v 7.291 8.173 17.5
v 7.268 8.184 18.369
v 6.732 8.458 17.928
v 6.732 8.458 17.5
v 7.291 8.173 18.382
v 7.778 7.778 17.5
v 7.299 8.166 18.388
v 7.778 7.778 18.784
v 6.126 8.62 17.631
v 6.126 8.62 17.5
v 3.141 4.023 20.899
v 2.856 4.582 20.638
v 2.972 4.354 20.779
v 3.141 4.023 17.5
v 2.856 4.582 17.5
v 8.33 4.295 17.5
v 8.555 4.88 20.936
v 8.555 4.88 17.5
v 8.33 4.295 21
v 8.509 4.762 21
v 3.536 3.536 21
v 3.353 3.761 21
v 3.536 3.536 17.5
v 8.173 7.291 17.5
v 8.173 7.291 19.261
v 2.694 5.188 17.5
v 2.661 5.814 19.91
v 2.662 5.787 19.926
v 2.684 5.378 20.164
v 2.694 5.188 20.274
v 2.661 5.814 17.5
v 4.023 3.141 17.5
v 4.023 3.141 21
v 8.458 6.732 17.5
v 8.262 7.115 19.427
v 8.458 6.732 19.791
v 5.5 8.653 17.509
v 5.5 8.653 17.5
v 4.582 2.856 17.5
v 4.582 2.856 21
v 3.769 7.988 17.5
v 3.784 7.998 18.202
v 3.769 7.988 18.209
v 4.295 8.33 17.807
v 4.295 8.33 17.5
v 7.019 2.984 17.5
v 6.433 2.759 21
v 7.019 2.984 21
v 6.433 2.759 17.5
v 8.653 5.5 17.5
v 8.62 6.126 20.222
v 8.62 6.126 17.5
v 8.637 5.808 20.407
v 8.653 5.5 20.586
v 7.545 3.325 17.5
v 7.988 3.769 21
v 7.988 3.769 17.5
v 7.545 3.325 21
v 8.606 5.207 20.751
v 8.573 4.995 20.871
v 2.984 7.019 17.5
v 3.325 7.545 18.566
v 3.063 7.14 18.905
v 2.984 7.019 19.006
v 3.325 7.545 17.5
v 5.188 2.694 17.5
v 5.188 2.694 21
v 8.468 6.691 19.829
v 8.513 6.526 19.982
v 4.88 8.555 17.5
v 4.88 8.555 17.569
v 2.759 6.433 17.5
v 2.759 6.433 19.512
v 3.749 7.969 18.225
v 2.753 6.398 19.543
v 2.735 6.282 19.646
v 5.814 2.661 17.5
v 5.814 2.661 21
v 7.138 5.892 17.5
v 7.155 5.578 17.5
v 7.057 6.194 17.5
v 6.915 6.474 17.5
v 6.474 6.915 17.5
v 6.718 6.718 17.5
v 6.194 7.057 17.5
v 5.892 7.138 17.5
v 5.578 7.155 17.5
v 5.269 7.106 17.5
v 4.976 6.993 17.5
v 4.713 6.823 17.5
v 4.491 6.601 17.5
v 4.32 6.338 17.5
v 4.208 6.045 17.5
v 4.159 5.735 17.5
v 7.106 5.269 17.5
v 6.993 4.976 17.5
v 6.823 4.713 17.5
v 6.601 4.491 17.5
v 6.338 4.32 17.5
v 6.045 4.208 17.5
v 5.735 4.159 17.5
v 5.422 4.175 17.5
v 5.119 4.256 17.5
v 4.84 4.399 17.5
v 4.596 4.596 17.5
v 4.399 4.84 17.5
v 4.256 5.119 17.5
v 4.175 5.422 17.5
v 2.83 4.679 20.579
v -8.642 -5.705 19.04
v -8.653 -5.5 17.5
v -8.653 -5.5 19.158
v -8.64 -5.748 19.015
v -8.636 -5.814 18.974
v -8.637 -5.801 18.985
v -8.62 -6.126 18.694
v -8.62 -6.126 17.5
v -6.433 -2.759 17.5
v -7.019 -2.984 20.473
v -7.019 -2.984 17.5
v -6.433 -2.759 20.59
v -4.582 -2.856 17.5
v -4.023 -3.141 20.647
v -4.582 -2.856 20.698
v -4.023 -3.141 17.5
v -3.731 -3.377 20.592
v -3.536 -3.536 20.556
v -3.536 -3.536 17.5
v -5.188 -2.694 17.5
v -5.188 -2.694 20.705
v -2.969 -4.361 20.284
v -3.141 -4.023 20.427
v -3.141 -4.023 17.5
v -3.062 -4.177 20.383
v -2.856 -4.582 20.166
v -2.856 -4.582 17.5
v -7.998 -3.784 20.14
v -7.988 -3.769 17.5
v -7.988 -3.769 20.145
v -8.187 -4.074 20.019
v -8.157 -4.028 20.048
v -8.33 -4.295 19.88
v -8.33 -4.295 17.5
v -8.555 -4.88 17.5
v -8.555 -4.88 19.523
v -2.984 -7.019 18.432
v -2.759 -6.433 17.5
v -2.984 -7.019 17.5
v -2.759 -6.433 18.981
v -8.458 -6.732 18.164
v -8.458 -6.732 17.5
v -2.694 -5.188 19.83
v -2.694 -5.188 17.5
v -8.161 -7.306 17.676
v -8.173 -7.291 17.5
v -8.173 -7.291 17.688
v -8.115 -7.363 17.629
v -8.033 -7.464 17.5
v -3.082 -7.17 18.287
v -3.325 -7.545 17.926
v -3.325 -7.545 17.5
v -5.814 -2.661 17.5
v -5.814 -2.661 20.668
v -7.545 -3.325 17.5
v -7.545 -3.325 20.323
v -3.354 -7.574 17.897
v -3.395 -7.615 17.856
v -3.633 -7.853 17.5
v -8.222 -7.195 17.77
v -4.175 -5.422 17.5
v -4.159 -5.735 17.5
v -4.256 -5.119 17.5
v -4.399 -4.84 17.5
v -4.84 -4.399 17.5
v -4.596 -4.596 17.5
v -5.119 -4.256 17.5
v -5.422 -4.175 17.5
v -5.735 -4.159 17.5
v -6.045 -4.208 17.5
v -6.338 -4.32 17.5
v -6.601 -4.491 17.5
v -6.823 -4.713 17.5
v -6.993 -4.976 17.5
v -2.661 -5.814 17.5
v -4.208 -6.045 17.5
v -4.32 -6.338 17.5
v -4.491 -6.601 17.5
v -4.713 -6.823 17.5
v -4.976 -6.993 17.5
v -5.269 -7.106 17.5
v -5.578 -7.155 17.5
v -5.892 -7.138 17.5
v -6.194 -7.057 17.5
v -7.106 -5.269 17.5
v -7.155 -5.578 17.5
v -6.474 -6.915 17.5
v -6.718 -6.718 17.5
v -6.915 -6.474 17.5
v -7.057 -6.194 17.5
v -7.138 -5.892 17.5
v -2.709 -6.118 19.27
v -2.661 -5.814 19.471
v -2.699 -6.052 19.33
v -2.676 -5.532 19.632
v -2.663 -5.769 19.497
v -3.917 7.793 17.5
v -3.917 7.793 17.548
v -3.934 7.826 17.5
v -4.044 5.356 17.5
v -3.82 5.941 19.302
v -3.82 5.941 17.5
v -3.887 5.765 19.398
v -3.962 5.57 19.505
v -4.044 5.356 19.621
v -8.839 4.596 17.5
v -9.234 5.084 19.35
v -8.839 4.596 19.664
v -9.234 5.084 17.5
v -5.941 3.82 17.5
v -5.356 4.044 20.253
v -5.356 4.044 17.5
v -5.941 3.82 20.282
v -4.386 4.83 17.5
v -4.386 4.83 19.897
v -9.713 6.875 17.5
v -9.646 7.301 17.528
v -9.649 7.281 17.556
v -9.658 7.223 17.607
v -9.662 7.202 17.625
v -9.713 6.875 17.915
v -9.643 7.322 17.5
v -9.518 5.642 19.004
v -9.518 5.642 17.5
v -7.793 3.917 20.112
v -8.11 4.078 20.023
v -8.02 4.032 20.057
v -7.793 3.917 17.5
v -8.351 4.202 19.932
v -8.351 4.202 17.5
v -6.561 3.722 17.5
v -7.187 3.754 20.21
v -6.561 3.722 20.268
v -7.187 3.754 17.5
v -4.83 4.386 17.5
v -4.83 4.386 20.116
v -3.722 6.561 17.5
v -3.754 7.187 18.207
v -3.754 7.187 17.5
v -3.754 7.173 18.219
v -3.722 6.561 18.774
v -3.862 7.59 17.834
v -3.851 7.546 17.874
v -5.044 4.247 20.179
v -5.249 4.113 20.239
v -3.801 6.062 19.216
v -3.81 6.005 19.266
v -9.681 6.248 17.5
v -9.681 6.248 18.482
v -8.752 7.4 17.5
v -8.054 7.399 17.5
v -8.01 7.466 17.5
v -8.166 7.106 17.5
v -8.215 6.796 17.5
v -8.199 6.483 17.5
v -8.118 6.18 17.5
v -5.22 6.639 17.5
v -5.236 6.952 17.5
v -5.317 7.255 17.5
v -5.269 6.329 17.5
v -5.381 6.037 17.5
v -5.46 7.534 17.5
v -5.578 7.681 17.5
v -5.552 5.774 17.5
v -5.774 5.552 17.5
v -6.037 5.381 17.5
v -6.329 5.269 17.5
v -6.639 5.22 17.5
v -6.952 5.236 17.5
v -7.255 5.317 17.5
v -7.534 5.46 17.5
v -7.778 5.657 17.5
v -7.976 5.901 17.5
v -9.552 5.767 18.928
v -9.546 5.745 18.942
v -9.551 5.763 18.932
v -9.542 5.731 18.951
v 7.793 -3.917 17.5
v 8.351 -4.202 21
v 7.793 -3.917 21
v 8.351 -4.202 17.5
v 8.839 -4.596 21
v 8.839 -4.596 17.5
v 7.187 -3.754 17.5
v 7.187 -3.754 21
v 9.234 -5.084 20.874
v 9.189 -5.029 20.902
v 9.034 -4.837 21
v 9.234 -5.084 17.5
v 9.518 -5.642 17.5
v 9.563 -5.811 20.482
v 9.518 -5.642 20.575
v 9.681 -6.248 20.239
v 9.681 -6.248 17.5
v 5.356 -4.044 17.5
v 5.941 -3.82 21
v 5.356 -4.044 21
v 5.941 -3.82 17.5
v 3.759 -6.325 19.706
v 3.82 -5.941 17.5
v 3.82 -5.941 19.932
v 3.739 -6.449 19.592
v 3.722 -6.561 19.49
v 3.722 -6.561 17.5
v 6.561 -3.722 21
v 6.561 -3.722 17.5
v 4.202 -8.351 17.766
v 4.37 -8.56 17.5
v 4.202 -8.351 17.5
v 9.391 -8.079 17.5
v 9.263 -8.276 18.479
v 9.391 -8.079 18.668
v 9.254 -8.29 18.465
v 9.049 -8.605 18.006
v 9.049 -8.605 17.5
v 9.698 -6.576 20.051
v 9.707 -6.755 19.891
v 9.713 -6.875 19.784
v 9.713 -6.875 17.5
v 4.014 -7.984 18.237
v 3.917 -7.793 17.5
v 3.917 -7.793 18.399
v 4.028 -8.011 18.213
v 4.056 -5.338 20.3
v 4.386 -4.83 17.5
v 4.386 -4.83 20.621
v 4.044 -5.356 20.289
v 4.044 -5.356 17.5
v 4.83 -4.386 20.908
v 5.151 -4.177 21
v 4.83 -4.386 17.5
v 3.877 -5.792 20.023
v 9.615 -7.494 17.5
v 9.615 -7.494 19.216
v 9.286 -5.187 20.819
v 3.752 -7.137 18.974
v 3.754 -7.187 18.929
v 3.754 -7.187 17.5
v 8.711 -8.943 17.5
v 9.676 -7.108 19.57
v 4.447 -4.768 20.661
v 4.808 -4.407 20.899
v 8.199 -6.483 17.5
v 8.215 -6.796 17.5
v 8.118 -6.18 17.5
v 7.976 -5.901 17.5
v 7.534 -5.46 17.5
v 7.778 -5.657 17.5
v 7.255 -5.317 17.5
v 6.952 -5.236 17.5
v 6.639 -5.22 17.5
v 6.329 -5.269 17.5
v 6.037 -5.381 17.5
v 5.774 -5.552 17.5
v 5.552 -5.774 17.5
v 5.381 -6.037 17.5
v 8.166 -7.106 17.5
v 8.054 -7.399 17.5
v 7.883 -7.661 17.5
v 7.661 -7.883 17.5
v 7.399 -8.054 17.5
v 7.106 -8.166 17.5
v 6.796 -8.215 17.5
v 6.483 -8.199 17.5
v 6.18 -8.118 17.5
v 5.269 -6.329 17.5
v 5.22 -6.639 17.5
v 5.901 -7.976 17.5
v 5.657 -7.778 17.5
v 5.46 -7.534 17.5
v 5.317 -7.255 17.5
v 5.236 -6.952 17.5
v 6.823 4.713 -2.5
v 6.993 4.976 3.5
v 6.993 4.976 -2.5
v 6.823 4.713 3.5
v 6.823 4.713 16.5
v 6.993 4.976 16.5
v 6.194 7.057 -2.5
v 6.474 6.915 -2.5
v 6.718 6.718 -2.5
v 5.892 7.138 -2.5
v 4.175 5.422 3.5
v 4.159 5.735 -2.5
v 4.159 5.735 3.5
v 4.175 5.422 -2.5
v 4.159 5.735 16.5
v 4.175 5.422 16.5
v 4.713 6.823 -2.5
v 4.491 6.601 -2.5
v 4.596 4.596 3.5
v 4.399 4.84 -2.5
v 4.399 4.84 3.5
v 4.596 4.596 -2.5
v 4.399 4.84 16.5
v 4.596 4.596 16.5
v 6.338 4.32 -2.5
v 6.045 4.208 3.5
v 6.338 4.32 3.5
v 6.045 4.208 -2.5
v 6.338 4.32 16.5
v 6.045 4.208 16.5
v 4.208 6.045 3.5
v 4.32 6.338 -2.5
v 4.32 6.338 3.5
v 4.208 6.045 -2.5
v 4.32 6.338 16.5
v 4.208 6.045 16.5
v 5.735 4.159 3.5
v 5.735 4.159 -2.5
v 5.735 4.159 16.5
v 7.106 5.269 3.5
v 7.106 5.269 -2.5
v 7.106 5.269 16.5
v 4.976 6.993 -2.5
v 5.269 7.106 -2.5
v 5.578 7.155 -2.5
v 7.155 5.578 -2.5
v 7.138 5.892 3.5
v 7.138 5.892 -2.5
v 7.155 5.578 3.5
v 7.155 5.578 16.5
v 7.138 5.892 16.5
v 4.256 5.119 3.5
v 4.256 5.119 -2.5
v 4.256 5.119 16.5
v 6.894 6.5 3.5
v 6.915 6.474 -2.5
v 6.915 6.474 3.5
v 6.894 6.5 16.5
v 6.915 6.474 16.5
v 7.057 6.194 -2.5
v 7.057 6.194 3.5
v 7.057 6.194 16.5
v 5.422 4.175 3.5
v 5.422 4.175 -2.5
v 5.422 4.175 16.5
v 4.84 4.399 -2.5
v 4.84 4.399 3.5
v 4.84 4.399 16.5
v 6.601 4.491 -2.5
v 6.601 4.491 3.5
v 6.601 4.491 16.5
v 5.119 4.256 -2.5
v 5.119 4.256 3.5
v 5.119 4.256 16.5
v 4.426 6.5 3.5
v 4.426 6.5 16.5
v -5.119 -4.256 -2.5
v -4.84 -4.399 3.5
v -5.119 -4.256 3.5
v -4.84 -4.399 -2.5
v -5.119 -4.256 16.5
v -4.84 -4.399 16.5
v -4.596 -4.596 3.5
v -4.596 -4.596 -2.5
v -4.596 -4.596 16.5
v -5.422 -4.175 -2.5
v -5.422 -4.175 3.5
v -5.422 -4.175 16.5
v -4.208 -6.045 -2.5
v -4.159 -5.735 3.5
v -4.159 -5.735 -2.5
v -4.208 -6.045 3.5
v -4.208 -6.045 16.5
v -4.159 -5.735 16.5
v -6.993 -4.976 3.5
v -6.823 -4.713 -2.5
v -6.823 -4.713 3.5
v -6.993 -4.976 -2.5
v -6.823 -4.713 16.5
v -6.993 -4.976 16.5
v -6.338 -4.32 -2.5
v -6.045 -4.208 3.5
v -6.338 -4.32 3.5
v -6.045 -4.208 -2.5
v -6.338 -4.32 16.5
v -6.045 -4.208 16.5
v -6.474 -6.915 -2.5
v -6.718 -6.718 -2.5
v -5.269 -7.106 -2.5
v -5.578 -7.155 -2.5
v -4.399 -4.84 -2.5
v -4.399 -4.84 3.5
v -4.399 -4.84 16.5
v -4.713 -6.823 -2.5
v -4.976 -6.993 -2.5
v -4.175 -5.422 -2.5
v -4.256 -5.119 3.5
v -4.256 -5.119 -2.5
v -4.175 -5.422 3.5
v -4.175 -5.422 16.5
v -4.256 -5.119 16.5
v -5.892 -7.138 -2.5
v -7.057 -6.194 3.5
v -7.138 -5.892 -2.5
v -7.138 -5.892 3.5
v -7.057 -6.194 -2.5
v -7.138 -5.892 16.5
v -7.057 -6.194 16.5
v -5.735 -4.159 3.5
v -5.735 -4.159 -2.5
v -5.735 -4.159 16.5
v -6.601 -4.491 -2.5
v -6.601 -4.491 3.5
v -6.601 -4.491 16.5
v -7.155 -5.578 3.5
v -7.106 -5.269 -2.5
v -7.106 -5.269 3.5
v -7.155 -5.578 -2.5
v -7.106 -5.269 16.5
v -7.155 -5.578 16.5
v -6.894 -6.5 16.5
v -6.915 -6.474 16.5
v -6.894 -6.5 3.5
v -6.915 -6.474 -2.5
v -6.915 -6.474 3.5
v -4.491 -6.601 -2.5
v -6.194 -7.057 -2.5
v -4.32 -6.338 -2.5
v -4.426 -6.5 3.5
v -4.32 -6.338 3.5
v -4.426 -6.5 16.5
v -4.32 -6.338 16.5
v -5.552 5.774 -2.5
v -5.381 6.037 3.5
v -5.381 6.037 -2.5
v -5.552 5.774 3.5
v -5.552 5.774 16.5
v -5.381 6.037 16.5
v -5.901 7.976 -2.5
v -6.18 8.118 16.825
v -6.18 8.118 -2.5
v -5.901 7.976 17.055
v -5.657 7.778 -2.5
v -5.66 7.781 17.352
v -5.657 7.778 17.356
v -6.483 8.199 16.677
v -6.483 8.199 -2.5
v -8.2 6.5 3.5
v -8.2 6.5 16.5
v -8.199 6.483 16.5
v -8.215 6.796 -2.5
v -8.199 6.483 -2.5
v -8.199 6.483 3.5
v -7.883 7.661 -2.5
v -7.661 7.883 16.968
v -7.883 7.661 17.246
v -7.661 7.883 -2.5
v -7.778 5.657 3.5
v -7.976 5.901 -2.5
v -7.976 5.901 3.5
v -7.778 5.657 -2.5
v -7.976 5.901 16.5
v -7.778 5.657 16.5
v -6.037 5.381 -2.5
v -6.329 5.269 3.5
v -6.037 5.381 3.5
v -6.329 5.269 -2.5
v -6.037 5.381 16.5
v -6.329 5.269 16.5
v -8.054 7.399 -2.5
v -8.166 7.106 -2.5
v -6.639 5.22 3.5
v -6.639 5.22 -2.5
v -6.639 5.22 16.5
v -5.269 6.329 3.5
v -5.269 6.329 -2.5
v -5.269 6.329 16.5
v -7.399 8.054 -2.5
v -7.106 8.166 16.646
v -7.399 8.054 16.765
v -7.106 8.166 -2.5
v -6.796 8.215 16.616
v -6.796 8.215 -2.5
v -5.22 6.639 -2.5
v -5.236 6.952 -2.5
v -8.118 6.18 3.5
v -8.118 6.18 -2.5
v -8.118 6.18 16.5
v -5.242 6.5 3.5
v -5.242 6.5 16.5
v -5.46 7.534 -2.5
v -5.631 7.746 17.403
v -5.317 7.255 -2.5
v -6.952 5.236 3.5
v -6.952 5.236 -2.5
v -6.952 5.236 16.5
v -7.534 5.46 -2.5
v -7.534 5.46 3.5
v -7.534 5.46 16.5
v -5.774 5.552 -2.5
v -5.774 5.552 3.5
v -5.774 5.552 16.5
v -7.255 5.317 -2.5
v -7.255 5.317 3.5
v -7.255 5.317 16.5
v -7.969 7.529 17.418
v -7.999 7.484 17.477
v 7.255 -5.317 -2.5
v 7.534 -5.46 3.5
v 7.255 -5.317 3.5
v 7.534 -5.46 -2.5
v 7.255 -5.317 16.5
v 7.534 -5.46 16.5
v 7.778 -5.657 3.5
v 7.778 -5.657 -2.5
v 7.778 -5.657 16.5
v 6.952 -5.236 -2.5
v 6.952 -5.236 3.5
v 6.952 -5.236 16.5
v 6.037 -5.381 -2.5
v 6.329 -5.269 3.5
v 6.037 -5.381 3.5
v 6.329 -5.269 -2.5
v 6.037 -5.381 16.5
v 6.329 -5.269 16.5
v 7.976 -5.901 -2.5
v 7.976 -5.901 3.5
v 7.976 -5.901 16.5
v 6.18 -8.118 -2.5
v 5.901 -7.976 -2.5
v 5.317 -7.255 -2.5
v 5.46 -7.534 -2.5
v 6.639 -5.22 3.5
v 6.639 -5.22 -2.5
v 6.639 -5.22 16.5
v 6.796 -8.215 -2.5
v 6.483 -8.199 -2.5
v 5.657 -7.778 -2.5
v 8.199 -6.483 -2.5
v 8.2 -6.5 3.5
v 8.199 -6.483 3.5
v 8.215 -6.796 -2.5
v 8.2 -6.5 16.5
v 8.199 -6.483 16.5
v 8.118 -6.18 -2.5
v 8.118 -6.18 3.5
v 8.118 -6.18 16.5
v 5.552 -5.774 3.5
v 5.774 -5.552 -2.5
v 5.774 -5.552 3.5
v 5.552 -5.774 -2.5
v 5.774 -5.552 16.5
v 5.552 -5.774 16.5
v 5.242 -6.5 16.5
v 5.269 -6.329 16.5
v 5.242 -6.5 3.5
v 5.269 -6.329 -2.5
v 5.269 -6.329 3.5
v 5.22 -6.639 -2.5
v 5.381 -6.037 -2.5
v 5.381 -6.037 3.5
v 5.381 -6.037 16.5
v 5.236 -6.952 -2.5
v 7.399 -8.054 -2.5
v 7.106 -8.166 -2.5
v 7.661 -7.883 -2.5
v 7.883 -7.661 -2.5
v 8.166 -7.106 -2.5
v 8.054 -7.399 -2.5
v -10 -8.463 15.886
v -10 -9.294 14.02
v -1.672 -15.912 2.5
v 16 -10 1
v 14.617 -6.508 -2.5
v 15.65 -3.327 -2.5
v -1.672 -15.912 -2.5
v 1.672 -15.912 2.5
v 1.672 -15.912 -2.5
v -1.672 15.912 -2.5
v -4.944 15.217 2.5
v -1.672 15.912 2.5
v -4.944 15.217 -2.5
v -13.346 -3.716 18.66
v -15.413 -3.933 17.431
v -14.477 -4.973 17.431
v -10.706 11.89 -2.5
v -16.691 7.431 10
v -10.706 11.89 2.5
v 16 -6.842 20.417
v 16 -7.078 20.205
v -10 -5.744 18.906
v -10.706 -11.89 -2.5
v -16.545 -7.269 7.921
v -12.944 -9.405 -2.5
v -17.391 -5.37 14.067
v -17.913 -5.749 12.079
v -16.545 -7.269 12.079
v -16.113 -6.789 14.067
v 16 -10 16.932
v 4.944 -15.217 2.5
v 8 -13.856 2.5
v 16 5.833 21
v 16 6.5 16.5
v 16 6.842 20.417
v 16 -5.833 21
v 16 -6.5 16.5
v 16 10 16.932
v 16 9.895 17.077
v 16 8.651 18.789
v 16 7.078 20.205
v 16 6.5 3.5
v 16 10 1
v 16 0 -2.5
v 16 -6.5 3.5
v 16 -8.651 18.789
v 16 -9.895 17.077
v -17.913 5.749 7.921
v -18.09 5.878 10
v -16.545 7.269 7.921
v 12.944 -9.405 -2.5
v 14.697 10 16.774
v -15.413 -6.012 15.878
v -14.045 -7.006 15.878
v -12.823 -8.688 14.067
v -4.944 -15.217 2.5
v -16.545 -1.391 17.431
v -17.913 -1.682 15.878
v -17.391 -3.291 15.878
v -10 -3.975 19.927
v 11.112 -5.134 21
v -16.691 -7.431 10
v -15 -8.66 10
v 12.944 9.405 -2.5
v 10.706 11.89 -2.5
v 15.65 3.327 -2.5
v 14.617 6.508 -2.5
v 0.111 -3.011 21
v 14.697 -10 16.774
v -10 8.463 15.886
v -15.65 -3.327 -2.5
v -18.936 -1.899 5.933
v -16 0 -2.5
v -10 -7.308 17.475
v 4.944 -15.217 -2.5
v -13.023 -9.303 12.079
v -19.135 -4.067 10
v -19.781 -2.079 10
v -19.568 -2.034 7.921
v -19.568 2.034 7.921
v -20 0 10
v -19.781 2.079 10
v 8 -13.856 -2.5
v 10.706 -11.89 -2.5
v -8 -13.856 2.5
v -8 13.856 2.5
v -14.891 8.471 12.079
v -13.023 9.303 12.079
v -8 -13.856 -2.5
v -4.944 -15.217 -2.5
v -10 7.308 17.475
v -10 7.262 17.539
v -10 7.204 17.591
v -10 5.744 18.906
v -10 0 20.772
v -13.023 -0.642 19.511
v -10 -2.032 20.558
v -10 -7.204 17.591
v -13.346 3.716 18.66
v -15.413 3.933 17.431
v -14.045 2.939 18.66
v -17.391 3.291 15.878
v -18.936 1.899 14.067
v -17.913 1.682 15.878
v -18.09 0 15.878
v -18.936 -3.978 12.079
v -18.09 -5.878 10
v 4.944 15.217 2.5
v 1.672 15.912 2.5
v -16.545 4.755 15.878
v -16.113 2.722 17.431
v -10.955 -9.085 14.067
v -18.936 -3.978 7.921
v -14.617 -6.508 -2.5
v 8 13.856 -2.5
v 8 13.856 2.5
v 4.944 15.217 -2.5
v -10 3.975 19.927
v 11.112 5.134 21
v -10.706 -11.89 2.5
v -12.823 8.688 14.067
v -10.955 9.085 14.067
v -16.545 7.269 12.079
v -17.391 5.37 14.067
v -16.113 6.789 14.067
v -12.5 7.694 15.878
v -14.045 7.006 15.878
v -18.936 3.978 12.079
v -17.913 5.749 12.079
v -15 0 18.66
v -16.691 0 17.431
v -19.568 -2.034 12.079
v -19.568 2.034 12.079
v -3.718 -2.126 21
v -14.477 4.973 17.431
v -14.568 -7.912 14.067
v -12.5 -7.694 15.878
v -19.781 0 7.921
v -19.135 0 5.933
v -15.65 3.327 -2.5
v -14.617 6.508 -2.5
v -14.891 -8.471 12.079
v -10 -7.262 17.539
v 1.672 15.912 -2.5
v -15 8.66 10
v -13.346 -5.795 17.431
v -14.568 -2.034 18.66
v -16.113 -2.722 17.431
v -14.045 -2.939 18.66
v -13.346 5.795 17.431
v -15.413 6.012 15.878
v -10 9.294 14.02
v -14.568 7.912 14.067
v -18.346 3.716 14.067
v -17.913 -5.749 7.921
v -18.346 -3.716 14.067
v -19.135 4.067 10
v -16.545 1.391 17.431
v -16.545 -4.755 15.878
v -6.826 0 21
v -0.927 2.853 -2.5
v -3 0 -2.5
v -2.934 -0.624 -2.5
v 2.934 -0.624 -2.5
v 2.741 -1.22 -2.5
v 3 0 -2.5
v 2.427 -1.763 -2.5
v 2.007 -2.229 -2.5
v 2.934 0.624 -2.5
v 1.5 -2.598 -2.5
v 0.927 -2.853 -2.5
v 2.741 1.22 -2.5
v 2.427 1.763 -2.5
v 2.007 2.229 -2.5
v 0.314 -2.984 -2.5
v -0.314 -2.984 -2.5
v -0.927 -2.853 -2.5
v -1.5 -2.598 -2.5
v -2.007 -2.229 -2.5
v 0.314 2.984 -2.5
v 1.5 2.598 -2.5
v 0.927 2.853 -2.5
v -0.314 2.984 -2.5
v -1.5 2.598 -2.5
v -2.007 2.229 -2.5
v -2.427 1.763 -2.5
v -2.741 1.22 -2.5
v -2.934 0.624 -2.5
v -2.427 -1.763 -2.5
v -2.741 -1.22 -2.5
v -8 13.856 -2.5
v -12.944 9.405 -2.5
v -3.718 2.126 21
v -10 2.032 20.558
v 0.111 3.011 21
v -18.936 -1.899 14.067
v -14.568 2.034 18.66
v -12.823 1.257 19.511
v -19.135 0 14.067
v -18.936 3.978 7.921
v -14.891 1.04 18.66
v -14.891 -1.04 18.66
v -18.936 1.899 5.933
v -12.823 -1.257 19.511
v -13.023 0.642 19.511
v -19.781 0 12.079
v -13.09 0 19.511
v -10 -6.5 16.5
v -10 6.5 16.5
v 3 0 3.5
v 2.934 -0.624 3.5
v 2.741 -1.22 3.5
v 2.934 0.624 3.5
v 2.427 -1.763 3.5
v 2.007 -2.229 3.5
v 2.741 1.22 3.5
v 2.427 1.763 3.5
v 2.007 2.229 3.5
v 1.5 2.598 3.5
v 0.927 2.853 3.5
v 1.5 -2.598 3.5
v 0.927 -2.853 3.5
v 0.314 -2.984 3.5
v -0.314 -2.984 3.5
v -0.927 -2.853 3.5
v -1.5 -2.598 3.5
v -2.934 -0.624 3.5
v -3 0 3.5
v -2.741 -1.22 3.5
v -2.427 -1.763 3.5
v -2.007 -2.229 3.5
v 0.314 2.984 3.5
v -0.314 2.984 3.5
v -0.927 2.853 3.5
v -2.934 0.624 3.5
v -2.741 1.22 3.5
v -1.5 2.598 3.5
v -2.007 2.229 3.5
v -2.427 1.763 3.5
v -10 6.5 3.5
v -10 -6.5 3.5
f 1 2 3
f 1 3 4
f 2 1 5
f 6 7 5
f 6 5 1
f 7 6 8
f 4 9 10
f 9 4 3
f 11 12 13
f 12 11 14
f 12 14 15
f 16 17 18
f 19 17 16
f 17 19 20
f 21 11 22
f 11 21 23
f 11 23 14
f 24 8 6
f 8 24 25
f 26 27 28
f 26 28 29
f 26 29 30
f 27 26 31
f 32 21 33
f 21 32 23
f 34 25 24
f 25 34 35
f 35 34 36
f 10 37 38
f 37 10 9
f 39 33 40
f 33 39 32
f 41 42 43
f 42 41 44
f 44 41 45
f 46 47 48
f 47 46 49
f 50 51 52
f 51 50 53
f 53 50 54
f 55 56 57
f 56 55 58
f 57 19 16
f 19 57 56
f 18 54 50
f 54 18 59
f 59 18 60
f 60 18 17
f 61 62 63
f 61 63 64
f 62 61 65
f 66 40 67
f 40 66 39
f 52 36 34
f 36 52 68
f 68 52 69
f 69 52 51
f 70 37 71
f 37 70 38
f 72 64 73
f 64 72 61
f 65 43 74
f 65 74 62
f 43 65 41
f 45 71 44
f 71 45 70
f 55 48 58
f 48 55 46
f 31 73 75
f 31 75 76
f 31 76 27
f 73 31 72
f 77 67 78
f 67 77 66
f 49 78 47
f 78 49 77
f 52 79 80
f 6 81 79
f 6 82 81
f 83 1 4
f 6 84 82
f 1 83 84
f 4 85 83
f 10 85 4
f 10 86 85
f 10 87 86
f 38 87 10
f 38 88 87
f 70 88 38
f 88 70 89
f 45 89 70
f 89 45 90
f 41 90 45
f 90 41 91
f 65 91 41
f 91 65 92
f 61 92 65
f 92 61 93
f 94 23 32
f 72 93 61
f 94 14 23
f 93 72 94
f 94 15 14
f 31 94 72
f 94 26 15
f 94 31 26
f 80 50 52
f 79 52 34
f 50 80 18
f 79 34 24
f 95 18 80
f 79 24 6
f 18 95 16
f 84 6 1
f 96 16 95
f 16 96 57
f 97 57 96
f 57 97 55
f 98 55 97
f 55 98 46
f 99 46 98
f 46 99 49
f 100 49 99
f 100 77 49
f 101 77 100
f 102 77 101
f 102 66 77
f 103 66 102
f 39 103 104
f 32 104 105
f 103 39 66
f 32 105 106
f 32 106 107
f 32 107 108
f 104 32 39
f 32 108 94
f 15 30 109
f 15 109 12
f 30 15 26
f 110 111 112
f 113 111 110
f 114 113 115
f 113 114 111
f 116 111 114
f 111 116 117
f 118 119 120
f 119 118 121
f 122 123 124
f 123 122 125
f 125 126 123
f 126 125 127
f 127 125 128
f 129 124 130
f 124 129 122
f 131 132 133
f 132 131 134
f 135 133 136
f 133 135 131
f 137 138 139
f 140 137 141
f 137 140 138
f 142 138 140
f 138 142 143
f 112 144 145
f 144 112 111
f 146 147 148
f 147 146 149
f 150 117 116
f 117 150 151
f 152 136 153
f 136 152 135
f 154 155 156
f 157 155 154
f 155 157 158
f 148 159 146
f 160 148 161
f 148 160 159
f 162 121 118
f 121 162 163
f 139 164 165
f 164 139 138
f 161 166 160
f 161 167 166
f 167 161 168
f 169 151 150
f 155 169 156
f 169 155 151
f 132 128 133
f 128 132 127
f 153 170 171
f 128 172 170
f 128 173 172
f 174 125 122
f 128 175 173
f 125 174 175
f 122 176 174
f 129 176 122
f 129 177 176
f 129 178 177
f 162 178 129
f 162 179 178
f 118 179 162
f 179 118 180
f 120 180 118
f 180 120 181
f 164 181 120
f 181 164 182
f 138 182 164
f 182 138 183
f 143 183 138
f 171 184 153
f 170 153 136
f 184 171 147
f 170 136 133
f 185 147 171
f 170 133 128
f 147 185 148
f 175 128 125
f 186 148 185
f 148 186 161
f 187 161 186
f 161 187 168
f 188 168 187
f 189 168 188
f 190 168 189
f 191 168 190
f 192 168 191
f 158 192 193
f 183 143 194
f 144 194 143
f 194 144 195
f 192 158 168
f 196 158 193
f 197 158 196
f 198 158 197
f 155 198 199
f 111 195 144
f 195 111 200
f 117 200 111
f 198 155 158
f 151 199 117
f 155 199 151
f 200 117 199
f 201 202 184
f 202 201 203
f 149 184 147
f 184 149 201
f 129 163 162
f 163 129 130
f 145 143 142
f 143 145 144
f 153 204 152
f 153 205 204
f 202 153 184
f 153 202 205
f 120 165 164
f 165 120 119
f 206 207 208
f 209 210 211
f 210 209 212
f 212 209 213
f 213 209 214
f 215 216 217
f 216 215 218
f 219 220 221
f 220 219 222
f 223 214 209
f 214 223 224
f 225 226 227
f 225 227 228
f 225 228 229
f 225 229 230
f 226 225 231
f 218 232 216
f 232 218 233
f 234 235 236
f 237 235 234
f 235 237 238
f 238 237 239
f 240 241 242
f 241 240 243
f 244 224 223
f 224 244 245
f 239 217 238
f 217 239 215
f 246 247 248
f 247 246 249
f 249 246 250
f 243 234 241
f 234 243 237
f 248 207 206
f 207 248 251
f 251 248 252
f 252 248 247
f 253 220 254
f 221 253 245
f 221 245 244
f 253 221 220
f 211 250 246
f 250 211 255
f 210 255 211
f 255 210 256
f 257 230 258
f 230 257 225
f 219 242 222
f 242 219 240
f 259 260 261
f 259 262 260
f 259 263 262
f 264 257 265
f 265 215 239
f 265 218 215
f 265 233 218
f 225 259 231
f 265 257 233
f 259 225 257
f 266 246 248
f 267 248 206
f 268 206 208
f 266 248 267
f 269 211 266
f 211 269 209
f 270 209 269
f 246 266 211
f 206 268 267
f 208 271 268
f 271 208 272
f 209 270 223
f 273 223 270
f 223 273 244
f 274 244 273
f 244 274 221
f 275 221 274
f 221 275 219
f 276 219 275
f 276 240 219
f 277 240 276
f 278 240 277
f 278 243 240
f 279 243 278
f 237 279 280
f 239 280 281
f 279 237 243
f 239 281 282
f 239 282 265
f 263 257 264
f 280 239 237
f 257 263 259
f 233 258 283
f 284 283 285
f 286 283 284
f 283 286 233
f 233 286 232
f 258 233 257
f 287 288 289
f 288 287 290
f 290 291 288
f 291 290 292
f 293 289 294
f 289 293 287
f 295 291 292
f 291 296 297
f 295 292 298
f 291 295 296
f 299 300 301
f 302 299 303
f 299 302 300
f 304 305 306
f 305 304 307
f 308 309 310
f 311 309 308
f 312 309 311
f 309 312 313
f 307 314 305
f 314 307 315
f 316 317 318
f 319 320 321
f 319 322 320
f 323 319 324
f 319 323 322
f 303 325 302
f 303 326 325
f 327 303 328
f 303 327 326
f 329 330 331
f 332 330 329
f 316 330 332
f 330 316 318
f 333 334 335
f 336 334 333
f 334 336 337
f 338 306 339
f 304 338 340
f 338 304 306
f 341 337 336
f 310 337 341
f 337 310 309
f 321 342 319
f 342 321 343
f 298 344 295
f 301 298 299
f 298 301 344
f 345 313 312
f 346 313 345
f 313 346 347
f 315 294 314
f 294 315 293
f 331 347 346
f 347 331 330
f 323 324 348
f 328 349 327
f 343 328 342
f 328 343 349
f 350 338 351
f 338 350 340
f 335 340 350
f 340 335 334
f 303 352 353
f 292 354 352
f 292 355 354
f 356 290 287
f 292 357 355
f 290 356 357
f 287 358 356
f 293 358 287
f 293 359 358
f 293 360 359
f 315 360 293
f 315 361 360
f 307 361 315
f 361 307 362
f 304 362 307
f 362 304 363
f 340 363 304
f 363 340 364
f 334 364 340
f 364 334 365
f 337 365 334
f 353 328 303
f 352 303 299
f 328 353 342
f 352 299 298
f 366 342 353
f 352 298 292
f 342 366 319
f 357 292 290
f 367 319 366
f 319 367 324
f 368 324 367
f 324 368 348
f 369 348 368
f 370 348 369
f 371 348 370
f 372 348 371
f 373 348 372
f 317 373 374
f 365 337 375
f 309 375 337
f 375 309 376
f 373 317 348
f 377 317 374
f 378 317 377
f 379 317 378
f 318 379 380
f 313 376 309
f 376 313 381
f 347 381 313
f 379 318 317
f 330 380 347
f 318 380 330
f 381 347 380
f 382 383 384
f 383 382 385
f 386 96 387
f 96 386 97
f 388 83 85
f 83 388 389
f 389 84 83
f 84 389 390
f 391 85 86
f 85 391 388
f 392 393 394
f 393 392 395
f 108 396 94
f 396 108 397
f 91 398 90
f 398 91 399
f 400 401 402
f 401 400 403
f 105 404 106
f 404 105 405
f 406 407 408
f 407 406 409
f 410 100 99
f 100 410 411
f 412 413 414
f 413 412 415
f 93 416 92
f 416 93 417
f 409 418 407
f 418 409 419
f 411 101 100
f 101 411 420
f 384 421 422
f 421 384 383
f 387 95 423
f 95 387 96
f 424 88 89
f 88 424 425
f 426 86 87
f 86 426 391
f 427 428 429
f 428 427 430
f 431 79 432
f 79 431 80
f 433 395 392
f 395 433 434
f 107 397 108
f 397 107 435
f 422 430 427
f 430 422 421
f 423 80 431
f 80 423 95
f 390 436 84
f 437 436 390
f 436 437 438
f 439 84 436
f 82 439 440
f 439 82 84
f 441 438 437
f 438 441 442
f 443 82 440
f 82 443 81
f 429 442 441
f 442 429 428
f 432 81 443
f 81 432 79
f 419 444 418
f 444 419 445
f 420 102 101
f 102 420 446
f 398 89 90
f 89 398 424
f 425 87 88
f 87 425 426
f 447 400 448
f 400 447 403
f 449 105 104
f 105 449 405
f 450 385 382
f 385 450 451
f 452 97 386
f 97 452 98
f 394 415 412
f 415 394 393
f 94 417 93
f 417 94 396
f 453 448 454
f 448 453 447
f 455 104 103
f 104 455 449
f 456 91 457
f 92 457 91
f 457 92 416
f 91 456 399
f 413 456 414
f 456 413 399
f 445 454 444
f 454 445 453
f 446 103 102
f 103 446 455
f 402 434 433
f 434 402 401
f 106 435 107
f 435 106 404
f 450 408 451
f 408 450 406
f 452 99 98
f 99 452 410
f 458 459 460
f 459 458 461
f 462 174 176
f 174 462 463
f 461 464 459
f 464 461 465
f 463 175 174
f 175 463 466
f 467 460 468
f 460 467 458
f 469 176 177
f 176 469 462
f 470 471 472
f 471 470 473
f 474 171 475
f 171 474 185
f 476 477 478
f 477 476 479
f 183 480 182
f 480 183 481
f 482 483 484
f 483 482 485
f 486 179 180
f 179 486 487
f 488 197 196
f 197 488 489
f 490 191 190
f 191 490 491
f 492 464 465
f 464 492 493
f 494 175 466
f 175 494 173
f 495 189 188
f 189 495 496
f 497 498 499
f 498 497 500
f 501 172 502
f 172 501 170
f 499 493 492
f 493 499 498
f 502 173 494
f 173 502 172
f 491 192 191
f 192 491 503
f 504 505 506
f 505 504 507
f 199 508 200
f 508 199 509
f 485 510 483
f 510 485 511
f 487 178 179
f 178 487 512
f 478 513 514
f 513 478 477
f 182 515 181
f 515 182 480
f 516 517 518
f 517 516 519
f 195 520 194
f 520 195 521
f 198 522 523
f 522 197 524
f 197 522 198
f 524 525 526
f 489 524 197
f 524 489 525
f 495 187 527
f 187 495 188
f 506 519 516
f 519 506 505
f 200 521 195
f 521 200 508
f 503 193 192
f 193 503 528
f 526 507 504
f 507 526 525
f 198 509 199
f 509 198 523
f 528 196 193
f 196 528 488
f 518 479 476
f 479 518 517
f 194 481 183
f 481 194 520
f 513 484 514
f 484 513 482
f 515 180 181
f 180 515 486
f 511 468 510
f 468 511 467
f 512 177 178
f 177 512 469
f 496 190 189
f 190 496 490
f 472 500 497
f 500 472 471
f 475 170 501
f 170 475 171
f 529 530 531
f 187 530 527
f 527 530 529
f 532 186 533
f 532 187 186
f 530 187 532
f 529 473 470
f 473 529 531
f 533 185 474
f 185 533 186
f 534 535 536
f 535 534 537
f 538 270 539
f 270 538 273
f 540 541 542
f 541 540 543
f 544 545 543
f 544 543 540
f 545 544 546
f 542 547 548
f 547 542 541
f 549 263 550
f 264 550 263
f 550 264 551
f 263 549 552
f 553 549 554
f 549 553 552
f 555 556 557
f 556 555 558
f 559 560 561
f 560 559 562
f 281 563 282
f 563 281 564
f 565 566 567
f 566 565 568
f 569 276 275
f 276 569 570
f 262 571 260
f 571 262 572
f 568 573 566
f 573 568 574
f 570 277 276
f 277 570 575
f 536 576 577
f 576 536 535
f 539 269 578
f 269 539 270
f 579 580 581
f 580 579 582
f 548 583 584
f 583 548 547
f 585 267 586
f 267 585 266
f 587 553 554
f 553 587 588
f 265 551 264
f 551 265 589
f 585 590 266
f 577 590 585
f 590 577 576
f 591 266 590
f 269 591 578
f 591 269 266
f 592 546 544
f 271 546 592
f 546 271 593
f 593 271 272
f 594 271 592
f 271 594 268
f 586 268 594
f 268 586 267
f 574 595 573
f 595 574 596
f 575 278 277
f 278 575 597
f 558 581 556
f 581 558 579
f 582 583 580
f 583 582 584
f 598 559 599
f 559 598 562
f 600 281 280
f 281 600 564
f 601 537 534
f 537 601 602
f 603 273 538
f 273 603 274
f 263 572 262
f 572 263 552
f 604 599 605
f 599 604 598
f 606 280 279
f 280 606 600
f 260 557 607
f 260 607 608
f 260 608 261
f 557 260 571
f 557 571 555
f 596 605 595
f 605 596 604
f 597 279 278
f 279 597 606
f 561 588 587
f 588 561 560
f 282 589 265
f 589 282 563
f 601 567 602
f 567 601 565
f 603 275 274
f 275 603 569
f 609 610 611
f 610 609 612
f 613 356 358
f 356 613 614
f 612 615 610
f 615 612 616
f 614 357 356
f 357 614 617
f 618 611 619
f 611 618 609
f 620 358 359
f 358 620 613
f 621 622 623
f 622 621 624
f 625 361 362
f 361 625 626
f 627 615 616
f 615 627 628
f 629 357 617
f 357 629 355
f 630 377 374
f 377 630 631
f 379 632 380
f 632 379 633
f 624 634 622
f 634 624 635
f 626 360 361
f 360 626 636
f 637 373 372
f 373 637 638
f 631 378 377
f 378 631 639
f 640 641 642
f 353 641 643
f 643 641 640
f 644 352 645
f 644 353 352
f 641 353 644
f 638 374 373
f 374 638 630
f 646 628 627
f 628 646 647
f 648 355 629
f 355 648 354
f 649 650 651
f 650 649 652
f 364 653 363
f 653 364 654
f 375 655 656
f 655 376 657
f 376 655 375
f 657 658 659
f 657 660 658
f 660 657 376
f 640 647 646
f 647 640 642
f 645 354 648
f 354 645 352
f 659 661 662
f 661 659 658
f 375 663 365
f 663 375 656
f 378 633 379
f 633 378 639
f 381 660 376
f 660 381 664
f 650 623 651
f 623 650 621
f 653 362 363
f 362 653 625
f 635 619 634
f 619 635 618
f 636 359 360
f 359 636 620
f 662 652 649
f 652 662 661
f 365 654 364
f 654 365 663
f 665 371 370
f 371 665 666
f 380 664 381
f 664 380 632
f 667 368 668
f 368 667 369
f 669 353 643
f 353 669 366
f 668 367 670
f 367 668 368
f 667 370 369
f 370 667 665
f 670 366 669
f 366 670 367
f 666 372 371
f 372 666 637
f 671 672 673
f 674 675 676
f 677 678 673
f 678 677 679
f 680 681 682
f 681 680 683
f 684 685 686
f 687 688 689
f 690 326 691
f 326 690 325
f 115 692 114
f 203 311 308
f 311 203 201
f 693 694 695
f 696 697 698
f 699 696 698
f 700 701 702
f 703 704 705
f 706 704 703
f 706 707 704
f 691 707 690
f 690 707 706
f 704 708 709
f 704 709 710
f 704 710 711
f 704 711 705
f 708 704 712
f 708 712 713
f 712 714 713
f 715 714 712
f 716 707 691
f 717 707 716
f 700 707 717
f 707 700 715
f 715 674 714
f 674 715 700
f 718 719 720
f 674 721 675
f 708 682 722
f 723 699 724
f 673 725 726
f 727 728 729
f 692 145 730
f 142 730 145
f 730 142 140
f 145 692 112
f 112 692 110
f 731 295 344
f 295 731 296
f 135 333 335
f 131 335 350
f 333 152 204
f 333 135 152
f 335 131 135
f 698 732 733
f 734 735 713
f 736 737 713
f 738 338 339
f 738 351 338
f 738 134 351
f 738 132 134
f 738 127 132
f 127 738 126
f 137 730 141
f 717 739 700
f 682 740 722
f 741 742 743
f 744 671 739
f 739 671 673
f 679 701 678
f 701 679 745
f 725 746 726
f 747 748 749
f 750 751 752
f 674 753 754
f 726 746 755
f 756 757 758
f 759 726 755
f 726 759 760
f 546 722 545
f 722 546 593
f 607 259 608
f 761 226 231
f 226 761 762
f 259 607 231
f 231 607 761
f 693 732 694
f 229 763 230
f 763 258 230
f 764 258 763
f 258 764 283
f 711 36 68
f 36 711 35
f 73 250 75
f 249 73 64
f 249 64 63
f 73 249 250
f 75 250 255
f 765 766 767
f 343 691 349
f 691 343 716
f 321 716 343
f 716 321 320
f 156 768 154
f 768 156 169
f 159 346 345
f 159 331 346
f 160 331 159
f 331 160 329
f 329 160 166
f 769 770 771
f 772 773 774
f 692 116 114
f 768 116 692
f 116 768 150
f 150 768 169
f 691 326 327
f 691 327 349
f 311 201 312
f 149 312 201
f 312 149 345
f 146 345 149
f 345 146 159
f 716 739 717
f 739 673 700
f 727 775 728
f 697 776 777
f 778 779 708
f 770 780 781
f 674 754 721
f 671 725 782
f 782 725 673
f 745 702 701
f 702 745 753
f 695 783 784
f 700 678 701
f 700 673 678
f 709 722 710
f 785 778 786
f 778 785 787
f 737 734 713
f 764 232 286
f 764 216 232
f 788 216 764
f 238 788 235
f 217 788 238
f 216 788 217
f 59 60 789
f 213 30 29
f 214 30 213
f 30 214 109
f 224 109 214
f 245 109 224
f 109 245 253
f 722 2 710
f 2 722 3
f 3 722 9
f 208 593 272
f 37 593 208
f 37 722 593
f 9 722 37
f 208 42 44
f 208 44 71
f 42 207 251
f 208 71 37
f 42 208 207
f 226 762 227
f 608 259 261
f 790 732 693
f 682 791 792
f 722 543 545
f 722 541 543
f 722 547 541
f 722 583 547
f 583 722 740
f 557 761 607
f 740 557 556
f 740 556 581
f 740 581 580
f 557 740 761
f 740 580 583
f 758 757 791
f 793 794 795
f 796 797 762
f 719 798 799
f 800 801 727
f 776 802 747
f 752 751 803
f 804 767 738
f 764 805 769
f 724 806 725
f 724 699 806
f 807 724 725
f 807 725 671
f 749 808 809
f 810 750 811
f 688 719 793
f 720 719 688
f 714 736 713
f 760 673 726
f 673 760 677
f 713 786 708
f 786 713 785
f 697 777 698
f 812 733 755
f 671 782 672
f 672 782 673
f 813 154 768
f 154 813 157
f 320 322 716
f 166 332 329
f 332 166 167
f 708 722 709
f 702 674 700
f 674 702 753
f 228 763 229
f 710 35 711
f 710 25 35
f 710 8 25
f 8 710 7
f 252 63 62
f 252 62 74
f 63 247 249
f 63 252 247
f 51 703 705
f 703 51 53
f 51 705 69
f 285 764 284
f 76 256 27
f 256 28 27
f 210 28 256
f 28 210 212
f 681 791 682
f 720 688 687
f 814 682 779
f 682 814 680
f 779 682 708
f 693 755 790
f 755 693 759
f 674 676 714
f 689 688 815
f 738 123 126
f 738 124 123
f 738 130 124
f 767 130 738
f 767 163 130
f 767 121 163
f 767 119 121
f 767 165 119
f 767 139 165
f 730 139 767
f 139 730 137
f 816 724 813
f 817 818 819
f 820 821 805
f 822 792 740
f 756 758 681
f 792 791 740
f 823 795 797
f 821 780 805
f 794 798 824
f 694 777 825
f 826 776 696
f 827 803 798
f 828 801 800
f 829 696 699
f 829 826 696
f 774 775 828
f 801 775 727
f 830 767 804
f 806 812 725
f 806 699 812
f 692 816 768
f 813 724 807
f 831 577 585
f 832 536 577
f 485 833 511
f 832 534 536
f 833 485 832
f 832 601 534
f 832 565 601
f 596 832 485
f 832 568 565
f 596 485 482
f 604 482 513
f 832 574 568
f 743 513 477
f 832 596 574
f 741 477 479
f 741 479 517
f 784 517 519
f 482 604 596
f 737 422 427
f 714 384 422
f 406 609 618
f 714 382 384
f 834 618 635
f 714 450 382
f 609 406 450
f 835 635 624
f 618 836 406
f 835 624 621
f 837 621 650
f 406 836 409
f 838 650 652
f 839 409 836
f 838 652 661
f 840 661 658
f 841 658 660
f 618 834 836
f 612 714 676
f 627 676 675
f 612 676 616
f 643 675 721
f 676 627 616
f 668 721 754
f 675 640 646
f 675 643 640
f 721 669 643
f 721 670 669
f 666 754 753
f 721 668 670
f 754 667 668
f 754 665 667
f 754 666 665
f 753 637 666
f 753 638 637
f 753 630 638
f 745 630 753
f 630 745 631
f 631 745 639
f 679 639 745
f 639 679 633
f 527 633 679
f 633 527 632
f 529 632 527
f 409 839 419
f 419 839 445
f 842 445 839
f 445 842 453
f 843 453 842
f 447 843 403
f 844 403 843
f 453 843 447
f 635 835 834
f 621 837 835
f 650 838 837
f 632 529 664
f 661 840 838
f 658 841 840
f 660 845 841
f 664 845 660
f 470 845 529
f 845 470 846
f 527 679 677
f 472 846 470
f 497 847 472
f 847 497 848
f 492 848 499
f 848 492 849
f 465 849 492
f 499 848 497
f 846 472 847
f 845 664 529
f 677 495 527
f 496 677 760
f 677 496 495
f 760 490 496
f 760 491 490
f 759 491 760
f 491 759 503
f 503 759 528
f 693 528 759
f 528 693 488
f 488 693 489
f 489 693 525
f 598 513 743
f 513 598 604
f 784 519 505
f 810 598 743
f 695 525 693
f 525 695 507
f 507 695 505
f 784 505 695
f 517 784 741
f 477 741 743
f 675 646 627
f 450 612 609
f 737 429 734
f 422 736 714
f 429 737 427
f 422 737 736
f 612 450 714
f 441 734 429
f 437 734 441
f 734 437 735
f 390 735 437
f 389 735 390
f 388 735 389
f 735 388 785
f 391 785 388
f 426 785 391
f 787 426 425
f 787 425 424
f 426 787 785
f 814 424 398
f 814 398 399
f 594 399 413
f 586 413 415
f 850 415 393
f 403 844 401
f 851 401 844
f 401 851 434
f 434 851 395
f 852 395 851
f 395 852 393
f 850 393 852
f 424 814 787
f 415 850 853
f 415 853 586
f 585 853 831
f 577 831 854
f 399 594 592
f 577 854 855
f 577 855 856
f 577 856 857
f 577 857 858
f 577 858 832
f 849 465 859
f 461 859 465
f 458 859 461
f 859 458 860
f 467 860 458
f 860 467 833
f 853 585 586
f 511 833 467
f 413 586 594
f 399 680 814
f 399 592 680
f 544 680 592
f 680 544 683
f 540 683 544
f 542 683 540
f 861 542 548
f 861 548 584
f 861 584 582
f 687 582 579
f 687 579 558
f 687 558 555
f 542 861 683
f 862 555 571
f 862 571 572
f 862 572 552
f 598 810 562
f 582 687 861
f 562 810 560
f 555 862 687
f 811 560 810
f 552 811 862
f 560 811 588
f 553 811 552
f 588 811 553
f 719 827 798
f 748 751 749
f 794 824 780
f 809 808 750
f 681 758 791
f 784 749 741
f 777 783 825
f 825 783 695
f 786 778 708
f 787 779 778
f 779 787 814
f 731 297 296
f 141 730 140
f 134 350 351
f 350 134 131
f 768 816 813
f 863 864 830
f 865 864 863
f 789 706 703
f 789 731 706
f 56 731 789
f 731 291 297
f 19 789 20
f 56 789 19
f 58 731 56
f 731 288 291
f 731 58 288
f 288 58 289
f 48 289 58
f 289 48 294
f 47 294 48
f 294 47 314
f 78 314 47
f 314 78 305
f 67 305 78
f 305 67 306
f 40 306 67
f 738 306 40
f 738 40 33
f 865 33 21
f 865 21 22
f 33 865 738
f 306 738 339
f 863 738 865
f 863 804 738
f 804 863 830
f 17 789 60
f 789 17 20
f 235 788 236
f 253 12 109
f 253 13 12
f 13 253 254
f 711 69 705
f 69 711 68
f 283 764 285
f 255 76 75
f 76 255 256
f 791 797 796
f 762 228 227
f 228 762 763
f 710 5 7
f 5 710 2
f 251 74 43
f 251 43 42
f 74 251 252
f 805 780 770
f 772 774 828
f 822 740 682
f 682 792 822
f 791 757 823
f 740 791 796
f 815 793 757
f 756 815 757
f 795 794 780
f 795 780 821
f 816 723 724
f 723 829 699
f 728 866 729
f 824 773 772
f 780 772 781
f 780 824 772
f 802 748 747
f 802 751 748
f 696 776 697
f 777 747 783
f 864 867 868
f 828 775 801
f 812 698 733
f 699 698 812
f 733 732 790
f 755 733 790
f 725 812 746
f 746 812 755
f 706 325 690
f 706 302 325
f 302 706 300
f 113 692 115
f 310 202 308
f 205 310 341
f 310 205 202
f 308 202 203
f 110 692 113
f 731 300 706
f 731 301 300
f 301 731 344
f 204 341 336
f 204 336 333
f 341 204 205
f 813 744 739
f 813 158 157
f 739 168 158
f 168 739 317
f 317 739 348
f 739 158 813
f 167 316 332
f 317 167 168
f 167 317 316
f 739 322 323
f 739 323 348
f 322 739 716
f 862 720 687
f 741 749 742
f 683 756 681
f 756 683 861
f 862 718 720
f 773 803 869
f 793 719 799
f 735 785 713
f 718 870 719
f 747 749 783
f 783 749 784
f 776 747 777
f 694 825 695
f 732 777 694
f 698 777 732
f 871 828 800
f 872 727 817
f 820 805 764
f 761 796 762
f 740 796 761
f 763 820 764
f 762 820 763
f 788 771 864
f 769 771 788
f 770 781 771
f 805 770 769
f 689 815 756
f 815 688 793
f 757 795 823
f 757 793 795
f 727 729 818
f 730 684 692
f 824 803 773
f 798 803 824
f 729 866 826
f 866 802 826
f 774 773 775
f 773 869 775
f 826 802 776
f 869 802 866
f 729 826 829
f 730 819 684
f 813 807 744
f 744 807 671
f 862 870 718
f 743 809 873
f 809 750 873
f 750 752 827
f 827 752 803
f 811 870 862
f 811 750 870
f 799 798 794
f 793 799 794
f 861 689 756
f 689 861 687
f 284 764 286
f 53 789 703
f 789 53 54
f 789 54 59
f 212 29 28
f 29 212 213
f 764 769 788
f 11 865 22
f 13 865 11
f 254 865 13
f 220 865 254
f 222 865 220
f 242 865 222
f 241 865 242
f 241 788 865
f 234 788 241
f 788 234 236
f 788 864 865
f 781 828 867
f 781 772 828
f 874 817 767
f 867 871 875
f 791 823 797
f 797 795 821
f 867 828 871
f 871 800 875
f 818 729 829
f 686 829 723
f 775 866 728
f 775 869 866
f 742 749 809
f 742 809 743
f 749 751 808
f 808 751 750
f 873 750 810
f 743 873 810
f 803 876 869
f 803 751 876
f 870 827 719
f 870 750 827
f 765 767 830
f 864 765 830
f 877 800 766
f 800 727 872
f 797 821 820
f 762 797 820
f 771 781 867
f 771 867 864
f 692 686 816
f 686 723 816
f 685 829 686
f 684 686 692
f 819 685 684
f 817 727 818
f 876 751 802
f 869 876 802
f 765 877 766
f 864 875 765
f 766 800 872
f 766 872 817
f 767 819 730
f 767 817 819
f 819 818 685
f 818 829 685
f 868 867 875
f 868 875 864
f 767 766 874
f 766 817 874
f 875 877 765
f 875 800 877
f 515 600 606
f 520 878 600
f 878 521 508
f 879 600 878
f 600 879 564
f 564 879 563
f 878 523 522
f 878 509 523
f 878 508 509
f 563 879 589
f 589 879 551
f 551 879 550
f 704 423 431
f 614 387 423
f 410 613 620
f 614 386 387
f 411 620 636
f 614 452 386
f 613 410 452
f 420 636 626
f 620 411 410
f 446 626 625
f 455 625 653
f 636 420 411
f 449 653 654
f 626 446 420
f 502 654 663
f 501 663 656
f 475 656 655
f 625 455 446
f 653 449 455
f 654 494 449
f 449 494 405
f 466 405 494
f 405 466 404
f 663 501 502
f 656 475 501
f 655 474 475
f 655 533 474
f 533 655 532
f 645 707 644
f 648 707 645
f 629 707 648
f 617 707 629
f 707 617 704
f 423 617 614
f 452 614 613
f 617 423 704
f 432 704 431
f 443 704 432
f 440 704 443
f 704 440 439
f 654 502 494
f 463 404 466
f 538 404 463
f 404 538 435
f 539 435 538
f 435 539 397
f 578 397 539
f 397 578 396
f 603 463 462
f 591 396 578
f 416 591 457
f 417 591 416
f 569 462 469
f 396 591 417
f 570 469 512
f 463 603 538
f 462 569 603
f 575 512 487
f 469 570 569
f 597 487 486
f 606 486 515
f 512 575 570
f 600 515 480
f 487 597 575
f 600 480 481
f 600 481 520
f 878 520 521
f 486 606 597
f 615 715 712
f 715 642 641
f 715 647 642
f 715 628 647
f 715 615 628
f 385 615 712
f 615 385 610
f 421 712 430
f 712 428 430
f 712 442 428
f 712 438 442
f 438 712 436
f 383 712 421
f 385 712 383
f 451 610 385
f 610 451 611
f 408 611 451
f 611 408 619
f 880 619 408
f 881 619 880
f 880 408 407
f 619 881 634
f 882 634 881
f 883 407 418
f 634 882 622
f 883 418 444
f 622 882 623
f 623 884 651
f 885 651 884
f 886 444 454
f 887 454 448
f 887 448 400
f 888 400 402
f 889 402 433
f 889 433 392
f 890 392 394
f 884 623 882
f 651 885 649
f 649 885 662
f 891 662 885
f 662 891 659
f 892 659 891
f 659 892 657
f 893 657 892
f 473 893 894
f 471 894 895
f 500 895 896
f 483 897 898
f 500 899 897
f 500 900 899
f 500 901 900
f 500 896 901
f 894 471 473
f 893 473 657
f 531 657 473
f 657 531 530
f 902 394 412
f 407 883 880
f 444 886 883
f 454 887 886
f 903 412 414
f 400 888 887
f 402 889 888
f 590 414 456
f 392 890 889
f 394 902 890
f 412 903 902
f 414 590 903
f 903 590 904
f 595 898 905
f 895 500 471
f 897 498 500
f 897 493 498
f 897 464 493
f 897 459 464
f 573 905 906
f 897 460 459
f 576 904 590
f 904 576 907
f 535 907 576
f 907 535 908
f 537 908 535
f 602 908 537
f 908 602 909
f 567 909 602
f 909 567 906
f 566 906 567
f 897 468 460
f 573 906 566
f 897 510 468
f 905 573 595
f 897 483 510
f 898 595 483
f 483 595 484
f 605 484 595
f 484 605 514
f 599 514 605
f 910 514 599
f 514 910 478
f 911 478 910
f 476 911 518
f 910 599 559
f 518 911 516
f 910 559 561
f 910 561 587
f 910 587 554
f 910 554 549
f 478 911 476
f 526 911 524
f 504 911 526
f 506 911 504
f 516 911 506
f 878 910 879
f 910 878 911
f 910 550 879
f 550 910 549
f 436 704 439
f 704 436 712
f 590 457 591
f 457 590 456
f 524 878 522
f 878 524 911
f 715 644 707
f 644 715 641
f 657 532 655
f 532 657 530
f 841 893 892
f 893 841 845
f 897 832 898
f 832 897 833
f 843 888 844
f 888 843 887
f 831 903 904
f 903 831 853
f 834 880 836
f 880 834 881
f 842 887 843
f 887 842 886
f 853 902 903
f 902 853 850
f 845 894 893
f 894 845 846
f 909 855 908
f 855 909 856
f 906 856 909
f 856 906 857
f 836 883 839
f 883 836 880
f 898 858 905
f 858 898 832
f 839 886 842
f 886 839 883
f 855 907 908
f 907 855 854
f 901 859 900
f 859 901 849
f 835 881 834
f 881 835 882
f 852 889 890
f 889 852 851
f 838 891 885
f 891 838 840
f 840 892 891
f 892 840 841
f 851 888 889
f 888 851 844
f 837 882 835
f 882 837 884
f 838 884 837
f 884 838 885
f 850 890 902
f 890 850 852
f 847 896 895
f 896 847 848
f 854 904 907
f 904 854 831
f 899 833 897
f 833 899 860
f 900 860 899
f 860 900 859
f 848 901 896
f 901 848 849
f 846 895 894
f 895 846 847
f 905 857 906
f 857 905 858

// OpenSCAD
/* [Motor Bolts] */
Motor_Bolt_X_spacing = 16; // Motor Bolts X distance
Motor_Bolt_Y_spacing = 19; // Motor Bolts Y distance
Screw_Size = 3; // Screw Size

/* [Motor Plate] */
Plate_Thickness = 5;
Plate_Diameter = 32;

/* [Arm Size] */
arm_outside_diameter = 13;

/* [Shell Size] */
Shell_OD = 20;

/* [Hidden] */
$fs = 0.2;
Plate_Radius = Plate_Diameter/2;


difference() {
    hull() {
        difference() {
            // Shell
            translate([3,0,11]) cube([26,Shell_OD,Shell_OD],true);
            // Shell clipping shape
            difference() {
                translate([5,0,11]) cube([32,Shell_OD+1,Shell_OD+1],true);      
                translate([5,0,11]) rotate([0,90,0]) cylinder(32,9.7,12,true);
                translate([5,0,0]) cube([40,Shell_OD+1,Shell_OD+1],true);
            }
        }
        // Motor Plate
        cylinder(Plate_Thickness,Plate_Radius,Plate_Radius,true);
        // End Ball
        translate([-Shell_OD/2,0,Shell_OD/2]) sphere(Shell_OD/2);
    }
    // Remove arm material
    translate ([20,0,10]) cube([60,arm_outside_diameter,arm_outside_diameter],true);
    // Remove motor post material
    translate([0,0,30]) motor_posts(25);
    // Remove motor screw material
    motor_screws(50);
    // Remove motor shaft clerance
    translate([0,0,0]) cylinder(8,3,3,true);
}

module motor_posts(sl=10) {
    rotate([0,0,45]) {
    translate([Motor_Bolt_X_spacing/2,0,0]) cylinder(sl,Screw_Size,Screw_Size,true);
    translate([-Motor_Bolt_X_spacing/2,0,0]) cylinder(sl,Screw_Size,Screw_Size,true);
    translate([0,Motor_Bolt_Y_spacing/2,0]) cylinder(sl,Screw_Size,Screw_Size,true);
    translate([0,-Motor_Bolt_Y_spacing/2,0]) cylinder(sl,Screw_Size,Screw_Size,true);
    }
}

module motor_screws(sl=10) {
    rotate([0,0,45]) {
    translate([Motor_Bolt_X_spacing/2,0,0]) cylinder(sl,Screw_Size/2,Screw_Size/2,true);
    translate([-Motor_Bolt_X_spacing/2,0,0]) cylinder(sl,Screw_Size/2,Screw_Size/2,true);
    translate([0,Motor_Bolt_Y_spacing/2,0]) cylinder(sl,Screw_Size/2,Screw_Size/2,true);
    translate([0/2,-Motor_Bolt_Y_spacing/2,0]) cylinder(sl,Screw_Size/2,Screw_Size/2,true);
    }
}
